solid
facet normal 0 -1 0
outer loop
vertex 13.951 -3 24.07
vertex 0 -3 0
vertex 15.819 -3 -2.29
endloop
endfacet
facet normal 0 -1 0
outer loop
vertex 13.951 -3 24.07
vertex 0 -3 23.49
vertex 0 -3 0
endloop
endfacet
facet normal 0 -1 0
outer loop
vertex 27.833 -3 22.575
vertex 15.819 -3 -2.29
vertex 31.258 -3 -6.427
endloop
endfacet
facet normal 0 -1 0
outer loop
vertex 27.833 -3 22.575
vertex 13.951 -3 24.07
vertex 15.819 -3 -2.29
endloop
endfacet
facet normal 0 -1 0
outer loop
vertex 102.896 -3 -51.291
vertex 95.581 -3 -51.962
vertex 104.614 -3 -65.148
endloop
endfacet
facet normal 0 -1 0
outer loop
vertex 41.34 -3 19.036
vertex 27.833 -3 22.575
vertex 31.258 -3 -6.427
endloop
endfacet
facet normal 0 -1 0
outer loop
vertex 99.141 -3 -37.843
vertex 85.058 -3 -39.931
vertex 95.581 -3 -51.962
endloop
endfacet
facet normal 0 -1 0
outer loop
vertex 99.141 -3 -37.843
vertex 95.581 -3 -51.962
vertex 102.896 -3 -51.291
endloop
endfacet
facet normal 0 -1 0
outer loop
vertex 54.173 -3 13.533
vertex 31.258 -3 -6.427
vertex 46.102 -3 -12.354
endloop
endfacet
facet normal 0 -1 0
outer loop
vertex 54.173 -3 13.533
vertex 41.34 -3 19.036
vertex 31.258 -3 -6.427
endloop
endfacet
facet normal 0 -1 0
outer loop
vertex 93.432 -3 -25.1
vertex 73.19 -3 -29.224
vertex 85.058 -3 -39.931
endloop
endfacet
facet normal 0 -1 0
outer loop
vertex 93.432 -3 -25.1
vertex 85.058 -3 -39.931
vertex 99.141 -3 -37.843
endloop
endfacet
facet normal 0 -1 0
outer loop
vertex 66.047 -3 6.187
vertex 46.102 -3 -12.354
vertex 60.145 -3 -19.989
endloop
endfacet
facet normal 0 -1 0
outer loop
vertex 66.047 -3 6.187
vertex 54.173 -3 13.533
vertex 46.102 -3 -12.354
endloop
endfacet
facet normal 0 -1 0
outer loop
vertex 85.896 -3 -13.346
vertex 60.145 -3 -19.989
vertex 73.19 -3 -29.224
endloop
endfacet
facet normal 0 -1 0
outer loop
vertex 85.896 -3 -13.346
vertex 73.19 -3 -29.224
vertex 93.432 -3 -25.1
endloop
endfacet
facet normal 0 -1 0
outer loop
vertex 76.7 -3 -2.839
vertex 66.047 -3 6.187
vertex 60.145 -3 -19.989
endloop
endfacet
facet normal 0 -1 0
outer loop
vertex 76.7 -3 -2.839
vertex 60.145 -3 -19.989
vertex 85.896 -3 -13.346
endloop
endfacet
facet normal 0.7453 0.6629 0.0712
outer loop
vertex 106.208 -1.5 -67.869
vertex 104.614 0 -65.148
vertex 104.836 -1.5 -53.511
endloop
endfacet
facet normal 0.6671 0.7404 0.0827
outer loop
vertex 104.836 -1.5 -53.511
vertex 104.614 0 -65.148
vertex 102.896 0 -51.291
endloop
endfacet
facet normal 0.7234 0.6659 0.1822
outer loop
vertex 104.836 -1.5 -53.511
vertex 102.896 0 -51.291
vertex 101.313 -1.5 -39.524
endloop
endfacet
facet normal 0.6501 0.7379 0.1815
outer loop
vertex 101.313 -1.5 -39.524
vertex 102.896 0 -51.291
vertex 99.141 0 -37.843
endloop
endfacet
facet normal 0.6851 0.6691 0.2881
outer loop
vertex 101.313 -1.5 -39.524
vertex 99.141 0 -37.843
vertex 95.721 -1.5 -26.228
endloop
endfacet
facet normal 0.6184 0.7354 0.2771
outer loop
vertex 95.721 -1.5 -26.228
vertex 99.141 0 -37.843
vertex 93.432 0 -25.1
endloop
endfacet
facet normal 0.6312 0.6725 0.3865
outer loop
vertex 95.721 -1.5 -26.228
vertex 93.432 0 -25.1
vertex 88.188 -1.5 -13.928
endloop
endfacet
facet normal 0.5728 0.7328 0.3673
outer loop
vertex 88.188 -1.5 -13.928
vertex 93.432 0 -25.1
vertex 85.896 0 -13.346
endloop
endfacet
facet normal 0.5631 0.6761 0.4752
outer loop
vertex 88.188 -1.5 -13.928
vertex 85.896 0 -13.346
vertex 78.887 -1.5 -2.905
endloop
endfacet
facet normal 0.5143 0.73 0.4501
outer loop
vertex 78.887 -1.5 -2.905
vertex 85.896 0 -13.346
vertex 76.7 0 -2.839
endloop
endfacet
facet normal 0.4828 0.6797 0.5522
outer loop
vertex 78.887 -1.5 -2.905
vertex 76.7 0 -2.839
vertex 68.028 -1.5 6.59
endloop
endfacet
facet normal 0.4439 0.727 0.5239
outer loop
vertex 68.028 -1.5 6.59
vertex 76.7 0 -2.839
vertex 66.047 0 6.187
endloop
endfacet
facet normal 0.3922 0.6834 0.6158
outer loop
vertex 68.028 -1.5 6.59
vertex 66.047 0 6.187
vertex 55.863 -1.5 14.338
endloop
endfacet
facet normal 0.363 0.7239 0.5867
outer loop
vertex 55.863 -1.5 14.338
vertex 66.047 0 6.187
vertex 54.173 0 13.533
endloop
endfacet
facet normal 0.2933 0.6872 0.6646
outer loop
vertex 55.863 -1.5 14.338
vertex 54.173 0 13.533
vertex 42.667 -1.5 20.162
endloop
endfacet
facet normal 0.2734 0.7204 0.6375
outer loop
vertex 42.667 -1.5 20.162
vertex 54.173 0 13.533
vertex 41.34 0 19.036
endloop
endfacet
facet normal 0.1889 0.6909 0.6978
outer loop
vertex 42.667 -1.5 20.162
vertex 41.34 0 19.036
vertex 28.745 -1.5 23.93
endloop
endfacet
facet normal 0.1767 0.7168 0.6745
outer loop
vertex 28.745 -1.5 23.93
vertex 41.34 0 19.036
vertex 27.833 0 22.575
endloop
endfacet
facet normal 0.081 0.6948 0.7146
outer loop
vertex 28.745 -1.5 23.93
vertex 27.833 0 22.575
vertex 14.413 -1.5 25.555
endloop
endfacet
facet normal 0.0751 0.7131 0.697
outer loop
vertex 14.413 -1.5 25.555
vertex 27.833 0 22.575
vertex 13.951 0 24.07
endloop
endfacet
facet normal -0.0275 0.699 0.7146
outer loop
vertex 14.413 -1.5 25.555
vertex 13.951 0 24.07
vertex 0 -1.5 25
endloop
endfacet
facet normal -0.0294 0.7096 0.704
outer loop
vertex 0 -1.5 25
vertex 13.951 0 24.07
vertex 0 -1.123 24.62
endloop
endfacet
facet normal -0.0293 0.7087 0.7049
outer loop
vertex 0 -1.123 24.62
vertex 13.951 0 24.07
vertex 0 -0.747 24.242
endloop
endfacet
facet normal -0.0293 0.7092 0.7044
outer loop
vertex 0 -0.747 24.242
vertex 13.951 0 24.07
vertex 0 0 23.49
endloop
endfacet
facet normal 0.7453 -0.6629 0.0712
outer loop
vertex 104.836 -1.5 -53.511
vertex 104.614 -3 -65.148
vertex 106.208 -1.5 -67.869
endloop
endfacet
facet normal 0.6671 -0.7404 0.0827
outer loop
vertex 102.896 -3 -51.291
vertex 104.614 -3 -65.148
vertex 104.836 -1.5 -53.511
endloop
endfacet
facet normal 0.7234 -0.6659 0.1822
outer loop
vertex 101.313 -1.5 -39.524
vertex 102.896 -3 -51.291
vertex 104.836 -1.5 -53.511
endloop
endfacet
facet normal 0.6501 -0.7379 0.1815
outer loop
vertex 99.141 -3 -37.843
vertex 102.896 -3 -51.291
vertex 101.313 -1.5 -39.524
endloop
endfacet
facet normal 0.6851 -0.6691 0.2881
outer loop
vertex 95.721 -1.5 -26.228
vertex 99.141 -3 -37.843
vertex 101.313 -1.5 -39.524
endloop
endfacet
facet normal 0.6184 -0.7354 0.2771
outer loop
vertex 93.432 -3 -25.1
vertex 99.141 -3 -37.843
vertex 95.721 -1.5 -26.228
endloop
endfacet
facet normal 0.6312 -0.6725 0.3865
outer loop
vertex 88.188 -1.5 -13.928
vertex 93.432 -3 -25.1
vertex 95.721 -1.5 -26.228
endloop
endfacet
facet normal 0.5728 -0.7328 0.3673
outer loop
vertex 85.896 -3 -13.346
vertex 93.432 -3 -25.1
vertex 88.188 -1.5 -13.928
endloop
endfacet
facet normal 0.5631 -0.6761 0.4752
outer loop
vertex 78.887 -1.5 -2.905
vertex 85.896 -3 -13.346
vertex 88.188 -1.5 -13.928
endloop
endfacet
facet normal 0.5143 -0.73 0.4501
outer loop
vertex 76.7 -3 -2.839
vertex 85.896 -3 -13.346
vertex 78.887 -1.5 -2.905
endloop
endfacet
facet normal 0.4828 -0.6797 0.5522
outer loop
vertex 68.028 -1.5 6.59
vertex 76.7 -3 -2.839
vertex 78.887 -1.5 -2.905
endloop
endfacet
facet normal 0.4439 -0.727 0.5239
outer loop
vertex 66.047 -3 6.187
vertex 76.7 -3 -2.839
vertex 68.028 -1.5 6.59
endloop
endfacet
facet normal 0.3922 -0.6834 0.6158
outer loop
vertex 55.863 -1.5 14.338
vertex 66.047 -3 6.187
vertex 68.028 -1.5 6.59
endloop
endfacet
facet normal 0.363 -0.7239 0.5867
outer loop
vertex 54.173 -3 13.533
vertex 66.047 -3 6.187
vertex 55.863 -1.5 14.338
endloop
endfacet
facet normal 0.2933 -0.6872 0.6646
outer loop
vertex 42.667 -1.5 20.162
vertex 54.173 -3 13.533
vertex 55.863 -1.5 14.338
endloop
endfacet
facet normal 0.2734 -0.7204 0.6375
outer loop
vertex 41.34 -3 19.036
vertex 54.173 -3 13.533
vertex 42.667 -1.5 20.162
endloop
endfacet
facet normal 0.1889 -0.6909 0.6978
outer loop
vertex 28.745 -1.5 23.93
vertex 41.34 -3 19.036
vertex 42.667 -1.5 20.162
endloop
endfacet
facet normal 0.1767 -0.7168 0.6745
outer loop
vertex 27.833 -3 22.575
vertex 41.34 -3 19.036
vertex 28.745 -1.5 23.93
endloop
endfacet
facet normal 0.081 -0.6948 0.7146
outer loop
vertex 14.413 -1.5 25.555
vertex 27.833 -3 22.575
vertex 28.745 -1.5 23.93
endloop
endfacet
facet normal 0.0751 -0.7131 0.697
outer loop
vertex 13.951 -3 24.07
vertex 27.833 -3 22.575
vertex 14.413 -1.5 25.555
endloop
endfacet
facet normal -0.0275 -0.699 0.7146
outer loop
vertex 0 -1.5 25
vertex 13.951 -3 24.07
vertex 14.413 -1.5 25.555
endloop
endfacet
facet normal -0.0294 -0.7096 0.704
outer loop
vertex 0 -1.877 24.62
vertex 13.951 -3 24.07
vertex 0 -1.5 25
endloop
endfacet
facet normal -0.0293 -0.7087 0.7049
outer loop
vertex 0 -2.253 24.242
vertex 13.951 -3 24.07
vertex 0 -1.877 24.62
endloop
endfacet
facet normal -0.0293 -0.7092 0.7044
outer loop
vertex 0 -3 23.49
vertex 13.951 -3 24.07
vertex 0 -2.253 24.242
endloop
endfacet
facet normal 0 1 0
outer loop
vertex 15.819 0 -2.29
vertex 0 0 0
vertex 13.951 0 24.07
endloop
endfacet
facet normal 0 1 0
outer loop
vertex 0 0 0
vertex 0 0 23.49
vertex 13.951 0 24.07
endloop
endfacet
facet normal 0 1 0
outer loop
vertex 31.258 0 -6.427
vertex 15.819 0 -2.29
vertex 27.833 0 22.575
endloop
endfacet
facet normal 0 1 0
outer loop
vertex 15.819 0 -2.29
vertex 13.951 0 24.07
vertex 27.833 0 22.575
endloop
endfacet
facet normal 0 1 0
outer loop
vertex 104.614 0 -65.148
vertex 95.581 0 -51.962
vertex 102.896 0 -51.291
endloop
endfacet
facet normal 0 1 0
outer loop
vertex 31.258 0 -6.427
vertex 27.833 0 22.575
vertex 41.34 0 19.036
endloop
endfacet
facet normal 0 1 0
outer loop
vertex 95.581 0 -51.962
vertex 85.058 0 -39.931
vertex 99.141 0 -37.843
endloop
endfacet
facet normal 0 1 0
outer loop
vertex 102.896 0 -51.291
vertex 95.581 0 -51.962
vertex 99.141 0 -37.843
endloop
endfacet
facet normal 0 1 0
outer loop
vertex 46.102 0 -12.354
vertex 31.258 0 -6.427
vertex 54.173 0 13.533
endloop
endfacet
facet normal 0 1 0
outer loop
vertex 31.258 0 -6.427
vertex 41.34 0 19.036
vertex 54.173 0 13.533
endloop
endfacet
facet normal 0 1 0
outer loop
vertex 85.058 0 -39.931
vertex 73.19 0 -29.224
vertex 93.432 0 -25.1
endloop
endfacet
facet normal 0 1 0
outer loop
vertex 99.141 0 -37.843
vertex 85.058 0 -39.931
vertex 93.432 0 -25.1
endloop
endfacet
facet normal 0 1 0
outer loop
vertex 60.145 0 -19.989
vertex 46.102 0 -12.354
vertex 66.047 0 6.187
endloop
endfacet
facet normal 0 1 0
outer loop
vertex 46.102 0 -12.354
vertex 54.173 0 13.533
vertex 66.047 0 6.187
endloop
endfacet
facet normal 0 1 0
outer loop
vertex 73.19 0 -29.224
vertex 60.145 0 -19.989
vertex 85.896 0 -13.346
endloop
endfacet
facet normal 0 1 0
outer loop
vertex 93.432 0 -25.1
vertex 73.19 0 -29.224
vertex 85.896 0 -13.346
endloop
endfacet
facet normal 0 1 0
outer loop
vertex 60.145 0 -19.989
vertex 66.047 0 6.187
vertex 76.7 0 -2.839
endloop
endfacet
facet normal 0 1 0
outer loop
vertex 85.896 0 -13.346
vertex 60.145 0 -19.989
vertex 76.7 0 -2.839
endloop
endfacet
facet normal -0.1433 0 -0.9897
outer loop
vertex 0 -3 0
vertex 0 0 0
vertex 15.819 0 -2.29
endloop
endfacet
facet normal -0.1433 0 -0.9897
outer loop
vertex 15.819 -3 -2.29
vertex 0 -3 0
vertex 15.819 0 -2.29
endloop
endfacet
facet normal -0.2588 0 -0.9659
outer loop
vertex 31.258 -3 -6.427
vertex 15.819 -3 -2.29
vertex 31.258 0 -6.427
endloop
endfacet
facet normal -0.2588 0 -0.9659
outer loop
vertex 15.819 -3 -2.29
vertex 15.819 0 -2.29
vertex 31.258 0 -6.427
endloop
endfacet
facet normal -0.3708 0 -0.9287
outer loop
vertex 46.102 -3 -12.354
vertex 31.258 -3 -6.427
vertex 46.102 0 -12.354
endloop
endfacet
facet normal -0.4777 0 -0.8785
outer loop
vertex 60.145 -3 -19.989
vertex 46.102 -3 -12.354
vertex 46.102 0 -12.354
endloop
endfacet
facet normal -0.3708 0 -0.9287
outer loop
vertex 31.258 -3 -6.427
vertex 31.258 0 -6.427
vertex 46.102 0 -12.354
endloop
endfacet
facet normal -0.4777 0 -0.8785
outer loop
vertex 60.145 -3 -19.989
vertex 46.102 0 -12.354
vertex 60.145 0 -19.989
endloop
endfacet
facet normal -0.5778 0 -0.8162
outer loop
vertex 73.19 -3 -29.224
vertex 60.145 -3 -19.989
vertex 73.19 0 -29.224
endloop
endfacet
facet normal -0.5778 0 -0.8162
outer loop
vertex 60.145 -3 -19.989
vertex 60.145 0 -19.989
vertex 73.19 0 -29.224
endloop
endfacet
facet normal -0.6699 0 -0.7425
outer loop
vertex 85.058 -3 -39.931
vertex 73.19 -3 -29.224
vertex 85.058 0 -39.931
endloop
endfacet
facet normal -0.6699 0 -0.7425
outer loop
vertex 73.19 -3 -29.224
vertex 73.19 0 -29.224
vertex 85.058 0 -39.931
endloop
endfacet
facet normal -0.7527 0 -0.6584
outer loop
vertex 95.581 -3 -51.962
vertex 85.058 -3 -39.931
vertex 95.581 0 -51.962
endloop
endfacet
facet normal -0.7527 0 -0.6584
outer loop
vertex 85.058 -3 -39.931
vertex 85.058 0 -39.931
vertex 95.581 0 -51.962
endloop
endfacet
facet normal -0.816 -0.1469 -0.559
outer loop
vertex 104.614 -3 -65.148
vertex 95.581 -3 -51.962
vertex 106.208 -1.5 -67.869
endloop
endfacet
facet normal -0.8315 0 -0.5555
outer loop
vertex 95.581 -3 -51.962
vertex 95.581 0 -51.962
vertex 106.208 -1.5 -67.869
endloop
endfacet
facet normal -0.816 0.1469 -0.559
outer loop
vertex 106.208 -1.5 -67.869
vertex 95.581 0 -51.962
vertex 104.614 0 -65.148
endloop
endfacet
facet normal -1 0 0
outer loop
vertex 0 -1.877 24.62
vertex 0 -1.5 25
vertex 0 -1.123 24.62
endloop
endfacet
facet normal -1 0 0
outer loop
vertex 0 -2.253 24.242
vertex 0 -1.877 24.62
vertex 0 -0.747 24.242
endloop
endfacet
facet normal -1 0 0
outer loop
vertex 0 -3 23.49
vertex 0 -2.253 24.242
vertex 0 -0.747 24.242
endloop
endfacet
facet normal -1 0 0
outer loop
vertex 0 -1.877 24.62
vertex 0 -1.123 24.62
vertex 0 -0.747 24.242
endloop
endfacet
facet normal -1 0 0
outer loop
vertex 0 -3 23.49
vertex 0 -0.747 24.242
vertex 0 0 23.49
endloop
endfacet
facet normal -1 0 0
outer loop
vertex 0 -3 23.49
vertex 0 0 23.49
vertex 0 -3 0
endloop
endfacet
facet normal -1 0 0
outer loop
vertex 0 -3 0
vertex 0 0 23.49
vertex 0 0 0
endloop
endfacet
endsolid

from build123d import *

# Parameters (mm, degrees)
F1_DEPTH = 3
F2_SIZE  = 1.49999


# Not quite as in the source:
# - a fillet or chamfer is up to 0.001 mm smaller than in the source, because OpenCascade refuses the exact size


with BuildPart() as f1:
    # F0 (on Front) → F1 (new body)
    with BuildSketch(Plane.XZ):
        with BuildLine():
            ThreePointArc((0, 0), (61.4781903769, -20.8298692006), (106.2082496532, -67.8689289283))
            ThreePointArc((106.2082496532, -67.8689289283), (73.6372514953, 2.0479582207), (0, 25))
            Line((0, 25), (0, 0))
        make_face()
    extrude(amount=F1_DEPTH)

    # F2 (size 1.5 in the source; OpenCascade refuses exactly that, so slightly less here)
    f2_edges = [f1.edges().sort_by_distance(p)[0] for p in [
        (73.637251, -3, 2.047958),
        (73.637251, 0, 2.047958),
    ]]
    chamfer(f2_edges, length=F2_SIZE)


solid = f1.part
